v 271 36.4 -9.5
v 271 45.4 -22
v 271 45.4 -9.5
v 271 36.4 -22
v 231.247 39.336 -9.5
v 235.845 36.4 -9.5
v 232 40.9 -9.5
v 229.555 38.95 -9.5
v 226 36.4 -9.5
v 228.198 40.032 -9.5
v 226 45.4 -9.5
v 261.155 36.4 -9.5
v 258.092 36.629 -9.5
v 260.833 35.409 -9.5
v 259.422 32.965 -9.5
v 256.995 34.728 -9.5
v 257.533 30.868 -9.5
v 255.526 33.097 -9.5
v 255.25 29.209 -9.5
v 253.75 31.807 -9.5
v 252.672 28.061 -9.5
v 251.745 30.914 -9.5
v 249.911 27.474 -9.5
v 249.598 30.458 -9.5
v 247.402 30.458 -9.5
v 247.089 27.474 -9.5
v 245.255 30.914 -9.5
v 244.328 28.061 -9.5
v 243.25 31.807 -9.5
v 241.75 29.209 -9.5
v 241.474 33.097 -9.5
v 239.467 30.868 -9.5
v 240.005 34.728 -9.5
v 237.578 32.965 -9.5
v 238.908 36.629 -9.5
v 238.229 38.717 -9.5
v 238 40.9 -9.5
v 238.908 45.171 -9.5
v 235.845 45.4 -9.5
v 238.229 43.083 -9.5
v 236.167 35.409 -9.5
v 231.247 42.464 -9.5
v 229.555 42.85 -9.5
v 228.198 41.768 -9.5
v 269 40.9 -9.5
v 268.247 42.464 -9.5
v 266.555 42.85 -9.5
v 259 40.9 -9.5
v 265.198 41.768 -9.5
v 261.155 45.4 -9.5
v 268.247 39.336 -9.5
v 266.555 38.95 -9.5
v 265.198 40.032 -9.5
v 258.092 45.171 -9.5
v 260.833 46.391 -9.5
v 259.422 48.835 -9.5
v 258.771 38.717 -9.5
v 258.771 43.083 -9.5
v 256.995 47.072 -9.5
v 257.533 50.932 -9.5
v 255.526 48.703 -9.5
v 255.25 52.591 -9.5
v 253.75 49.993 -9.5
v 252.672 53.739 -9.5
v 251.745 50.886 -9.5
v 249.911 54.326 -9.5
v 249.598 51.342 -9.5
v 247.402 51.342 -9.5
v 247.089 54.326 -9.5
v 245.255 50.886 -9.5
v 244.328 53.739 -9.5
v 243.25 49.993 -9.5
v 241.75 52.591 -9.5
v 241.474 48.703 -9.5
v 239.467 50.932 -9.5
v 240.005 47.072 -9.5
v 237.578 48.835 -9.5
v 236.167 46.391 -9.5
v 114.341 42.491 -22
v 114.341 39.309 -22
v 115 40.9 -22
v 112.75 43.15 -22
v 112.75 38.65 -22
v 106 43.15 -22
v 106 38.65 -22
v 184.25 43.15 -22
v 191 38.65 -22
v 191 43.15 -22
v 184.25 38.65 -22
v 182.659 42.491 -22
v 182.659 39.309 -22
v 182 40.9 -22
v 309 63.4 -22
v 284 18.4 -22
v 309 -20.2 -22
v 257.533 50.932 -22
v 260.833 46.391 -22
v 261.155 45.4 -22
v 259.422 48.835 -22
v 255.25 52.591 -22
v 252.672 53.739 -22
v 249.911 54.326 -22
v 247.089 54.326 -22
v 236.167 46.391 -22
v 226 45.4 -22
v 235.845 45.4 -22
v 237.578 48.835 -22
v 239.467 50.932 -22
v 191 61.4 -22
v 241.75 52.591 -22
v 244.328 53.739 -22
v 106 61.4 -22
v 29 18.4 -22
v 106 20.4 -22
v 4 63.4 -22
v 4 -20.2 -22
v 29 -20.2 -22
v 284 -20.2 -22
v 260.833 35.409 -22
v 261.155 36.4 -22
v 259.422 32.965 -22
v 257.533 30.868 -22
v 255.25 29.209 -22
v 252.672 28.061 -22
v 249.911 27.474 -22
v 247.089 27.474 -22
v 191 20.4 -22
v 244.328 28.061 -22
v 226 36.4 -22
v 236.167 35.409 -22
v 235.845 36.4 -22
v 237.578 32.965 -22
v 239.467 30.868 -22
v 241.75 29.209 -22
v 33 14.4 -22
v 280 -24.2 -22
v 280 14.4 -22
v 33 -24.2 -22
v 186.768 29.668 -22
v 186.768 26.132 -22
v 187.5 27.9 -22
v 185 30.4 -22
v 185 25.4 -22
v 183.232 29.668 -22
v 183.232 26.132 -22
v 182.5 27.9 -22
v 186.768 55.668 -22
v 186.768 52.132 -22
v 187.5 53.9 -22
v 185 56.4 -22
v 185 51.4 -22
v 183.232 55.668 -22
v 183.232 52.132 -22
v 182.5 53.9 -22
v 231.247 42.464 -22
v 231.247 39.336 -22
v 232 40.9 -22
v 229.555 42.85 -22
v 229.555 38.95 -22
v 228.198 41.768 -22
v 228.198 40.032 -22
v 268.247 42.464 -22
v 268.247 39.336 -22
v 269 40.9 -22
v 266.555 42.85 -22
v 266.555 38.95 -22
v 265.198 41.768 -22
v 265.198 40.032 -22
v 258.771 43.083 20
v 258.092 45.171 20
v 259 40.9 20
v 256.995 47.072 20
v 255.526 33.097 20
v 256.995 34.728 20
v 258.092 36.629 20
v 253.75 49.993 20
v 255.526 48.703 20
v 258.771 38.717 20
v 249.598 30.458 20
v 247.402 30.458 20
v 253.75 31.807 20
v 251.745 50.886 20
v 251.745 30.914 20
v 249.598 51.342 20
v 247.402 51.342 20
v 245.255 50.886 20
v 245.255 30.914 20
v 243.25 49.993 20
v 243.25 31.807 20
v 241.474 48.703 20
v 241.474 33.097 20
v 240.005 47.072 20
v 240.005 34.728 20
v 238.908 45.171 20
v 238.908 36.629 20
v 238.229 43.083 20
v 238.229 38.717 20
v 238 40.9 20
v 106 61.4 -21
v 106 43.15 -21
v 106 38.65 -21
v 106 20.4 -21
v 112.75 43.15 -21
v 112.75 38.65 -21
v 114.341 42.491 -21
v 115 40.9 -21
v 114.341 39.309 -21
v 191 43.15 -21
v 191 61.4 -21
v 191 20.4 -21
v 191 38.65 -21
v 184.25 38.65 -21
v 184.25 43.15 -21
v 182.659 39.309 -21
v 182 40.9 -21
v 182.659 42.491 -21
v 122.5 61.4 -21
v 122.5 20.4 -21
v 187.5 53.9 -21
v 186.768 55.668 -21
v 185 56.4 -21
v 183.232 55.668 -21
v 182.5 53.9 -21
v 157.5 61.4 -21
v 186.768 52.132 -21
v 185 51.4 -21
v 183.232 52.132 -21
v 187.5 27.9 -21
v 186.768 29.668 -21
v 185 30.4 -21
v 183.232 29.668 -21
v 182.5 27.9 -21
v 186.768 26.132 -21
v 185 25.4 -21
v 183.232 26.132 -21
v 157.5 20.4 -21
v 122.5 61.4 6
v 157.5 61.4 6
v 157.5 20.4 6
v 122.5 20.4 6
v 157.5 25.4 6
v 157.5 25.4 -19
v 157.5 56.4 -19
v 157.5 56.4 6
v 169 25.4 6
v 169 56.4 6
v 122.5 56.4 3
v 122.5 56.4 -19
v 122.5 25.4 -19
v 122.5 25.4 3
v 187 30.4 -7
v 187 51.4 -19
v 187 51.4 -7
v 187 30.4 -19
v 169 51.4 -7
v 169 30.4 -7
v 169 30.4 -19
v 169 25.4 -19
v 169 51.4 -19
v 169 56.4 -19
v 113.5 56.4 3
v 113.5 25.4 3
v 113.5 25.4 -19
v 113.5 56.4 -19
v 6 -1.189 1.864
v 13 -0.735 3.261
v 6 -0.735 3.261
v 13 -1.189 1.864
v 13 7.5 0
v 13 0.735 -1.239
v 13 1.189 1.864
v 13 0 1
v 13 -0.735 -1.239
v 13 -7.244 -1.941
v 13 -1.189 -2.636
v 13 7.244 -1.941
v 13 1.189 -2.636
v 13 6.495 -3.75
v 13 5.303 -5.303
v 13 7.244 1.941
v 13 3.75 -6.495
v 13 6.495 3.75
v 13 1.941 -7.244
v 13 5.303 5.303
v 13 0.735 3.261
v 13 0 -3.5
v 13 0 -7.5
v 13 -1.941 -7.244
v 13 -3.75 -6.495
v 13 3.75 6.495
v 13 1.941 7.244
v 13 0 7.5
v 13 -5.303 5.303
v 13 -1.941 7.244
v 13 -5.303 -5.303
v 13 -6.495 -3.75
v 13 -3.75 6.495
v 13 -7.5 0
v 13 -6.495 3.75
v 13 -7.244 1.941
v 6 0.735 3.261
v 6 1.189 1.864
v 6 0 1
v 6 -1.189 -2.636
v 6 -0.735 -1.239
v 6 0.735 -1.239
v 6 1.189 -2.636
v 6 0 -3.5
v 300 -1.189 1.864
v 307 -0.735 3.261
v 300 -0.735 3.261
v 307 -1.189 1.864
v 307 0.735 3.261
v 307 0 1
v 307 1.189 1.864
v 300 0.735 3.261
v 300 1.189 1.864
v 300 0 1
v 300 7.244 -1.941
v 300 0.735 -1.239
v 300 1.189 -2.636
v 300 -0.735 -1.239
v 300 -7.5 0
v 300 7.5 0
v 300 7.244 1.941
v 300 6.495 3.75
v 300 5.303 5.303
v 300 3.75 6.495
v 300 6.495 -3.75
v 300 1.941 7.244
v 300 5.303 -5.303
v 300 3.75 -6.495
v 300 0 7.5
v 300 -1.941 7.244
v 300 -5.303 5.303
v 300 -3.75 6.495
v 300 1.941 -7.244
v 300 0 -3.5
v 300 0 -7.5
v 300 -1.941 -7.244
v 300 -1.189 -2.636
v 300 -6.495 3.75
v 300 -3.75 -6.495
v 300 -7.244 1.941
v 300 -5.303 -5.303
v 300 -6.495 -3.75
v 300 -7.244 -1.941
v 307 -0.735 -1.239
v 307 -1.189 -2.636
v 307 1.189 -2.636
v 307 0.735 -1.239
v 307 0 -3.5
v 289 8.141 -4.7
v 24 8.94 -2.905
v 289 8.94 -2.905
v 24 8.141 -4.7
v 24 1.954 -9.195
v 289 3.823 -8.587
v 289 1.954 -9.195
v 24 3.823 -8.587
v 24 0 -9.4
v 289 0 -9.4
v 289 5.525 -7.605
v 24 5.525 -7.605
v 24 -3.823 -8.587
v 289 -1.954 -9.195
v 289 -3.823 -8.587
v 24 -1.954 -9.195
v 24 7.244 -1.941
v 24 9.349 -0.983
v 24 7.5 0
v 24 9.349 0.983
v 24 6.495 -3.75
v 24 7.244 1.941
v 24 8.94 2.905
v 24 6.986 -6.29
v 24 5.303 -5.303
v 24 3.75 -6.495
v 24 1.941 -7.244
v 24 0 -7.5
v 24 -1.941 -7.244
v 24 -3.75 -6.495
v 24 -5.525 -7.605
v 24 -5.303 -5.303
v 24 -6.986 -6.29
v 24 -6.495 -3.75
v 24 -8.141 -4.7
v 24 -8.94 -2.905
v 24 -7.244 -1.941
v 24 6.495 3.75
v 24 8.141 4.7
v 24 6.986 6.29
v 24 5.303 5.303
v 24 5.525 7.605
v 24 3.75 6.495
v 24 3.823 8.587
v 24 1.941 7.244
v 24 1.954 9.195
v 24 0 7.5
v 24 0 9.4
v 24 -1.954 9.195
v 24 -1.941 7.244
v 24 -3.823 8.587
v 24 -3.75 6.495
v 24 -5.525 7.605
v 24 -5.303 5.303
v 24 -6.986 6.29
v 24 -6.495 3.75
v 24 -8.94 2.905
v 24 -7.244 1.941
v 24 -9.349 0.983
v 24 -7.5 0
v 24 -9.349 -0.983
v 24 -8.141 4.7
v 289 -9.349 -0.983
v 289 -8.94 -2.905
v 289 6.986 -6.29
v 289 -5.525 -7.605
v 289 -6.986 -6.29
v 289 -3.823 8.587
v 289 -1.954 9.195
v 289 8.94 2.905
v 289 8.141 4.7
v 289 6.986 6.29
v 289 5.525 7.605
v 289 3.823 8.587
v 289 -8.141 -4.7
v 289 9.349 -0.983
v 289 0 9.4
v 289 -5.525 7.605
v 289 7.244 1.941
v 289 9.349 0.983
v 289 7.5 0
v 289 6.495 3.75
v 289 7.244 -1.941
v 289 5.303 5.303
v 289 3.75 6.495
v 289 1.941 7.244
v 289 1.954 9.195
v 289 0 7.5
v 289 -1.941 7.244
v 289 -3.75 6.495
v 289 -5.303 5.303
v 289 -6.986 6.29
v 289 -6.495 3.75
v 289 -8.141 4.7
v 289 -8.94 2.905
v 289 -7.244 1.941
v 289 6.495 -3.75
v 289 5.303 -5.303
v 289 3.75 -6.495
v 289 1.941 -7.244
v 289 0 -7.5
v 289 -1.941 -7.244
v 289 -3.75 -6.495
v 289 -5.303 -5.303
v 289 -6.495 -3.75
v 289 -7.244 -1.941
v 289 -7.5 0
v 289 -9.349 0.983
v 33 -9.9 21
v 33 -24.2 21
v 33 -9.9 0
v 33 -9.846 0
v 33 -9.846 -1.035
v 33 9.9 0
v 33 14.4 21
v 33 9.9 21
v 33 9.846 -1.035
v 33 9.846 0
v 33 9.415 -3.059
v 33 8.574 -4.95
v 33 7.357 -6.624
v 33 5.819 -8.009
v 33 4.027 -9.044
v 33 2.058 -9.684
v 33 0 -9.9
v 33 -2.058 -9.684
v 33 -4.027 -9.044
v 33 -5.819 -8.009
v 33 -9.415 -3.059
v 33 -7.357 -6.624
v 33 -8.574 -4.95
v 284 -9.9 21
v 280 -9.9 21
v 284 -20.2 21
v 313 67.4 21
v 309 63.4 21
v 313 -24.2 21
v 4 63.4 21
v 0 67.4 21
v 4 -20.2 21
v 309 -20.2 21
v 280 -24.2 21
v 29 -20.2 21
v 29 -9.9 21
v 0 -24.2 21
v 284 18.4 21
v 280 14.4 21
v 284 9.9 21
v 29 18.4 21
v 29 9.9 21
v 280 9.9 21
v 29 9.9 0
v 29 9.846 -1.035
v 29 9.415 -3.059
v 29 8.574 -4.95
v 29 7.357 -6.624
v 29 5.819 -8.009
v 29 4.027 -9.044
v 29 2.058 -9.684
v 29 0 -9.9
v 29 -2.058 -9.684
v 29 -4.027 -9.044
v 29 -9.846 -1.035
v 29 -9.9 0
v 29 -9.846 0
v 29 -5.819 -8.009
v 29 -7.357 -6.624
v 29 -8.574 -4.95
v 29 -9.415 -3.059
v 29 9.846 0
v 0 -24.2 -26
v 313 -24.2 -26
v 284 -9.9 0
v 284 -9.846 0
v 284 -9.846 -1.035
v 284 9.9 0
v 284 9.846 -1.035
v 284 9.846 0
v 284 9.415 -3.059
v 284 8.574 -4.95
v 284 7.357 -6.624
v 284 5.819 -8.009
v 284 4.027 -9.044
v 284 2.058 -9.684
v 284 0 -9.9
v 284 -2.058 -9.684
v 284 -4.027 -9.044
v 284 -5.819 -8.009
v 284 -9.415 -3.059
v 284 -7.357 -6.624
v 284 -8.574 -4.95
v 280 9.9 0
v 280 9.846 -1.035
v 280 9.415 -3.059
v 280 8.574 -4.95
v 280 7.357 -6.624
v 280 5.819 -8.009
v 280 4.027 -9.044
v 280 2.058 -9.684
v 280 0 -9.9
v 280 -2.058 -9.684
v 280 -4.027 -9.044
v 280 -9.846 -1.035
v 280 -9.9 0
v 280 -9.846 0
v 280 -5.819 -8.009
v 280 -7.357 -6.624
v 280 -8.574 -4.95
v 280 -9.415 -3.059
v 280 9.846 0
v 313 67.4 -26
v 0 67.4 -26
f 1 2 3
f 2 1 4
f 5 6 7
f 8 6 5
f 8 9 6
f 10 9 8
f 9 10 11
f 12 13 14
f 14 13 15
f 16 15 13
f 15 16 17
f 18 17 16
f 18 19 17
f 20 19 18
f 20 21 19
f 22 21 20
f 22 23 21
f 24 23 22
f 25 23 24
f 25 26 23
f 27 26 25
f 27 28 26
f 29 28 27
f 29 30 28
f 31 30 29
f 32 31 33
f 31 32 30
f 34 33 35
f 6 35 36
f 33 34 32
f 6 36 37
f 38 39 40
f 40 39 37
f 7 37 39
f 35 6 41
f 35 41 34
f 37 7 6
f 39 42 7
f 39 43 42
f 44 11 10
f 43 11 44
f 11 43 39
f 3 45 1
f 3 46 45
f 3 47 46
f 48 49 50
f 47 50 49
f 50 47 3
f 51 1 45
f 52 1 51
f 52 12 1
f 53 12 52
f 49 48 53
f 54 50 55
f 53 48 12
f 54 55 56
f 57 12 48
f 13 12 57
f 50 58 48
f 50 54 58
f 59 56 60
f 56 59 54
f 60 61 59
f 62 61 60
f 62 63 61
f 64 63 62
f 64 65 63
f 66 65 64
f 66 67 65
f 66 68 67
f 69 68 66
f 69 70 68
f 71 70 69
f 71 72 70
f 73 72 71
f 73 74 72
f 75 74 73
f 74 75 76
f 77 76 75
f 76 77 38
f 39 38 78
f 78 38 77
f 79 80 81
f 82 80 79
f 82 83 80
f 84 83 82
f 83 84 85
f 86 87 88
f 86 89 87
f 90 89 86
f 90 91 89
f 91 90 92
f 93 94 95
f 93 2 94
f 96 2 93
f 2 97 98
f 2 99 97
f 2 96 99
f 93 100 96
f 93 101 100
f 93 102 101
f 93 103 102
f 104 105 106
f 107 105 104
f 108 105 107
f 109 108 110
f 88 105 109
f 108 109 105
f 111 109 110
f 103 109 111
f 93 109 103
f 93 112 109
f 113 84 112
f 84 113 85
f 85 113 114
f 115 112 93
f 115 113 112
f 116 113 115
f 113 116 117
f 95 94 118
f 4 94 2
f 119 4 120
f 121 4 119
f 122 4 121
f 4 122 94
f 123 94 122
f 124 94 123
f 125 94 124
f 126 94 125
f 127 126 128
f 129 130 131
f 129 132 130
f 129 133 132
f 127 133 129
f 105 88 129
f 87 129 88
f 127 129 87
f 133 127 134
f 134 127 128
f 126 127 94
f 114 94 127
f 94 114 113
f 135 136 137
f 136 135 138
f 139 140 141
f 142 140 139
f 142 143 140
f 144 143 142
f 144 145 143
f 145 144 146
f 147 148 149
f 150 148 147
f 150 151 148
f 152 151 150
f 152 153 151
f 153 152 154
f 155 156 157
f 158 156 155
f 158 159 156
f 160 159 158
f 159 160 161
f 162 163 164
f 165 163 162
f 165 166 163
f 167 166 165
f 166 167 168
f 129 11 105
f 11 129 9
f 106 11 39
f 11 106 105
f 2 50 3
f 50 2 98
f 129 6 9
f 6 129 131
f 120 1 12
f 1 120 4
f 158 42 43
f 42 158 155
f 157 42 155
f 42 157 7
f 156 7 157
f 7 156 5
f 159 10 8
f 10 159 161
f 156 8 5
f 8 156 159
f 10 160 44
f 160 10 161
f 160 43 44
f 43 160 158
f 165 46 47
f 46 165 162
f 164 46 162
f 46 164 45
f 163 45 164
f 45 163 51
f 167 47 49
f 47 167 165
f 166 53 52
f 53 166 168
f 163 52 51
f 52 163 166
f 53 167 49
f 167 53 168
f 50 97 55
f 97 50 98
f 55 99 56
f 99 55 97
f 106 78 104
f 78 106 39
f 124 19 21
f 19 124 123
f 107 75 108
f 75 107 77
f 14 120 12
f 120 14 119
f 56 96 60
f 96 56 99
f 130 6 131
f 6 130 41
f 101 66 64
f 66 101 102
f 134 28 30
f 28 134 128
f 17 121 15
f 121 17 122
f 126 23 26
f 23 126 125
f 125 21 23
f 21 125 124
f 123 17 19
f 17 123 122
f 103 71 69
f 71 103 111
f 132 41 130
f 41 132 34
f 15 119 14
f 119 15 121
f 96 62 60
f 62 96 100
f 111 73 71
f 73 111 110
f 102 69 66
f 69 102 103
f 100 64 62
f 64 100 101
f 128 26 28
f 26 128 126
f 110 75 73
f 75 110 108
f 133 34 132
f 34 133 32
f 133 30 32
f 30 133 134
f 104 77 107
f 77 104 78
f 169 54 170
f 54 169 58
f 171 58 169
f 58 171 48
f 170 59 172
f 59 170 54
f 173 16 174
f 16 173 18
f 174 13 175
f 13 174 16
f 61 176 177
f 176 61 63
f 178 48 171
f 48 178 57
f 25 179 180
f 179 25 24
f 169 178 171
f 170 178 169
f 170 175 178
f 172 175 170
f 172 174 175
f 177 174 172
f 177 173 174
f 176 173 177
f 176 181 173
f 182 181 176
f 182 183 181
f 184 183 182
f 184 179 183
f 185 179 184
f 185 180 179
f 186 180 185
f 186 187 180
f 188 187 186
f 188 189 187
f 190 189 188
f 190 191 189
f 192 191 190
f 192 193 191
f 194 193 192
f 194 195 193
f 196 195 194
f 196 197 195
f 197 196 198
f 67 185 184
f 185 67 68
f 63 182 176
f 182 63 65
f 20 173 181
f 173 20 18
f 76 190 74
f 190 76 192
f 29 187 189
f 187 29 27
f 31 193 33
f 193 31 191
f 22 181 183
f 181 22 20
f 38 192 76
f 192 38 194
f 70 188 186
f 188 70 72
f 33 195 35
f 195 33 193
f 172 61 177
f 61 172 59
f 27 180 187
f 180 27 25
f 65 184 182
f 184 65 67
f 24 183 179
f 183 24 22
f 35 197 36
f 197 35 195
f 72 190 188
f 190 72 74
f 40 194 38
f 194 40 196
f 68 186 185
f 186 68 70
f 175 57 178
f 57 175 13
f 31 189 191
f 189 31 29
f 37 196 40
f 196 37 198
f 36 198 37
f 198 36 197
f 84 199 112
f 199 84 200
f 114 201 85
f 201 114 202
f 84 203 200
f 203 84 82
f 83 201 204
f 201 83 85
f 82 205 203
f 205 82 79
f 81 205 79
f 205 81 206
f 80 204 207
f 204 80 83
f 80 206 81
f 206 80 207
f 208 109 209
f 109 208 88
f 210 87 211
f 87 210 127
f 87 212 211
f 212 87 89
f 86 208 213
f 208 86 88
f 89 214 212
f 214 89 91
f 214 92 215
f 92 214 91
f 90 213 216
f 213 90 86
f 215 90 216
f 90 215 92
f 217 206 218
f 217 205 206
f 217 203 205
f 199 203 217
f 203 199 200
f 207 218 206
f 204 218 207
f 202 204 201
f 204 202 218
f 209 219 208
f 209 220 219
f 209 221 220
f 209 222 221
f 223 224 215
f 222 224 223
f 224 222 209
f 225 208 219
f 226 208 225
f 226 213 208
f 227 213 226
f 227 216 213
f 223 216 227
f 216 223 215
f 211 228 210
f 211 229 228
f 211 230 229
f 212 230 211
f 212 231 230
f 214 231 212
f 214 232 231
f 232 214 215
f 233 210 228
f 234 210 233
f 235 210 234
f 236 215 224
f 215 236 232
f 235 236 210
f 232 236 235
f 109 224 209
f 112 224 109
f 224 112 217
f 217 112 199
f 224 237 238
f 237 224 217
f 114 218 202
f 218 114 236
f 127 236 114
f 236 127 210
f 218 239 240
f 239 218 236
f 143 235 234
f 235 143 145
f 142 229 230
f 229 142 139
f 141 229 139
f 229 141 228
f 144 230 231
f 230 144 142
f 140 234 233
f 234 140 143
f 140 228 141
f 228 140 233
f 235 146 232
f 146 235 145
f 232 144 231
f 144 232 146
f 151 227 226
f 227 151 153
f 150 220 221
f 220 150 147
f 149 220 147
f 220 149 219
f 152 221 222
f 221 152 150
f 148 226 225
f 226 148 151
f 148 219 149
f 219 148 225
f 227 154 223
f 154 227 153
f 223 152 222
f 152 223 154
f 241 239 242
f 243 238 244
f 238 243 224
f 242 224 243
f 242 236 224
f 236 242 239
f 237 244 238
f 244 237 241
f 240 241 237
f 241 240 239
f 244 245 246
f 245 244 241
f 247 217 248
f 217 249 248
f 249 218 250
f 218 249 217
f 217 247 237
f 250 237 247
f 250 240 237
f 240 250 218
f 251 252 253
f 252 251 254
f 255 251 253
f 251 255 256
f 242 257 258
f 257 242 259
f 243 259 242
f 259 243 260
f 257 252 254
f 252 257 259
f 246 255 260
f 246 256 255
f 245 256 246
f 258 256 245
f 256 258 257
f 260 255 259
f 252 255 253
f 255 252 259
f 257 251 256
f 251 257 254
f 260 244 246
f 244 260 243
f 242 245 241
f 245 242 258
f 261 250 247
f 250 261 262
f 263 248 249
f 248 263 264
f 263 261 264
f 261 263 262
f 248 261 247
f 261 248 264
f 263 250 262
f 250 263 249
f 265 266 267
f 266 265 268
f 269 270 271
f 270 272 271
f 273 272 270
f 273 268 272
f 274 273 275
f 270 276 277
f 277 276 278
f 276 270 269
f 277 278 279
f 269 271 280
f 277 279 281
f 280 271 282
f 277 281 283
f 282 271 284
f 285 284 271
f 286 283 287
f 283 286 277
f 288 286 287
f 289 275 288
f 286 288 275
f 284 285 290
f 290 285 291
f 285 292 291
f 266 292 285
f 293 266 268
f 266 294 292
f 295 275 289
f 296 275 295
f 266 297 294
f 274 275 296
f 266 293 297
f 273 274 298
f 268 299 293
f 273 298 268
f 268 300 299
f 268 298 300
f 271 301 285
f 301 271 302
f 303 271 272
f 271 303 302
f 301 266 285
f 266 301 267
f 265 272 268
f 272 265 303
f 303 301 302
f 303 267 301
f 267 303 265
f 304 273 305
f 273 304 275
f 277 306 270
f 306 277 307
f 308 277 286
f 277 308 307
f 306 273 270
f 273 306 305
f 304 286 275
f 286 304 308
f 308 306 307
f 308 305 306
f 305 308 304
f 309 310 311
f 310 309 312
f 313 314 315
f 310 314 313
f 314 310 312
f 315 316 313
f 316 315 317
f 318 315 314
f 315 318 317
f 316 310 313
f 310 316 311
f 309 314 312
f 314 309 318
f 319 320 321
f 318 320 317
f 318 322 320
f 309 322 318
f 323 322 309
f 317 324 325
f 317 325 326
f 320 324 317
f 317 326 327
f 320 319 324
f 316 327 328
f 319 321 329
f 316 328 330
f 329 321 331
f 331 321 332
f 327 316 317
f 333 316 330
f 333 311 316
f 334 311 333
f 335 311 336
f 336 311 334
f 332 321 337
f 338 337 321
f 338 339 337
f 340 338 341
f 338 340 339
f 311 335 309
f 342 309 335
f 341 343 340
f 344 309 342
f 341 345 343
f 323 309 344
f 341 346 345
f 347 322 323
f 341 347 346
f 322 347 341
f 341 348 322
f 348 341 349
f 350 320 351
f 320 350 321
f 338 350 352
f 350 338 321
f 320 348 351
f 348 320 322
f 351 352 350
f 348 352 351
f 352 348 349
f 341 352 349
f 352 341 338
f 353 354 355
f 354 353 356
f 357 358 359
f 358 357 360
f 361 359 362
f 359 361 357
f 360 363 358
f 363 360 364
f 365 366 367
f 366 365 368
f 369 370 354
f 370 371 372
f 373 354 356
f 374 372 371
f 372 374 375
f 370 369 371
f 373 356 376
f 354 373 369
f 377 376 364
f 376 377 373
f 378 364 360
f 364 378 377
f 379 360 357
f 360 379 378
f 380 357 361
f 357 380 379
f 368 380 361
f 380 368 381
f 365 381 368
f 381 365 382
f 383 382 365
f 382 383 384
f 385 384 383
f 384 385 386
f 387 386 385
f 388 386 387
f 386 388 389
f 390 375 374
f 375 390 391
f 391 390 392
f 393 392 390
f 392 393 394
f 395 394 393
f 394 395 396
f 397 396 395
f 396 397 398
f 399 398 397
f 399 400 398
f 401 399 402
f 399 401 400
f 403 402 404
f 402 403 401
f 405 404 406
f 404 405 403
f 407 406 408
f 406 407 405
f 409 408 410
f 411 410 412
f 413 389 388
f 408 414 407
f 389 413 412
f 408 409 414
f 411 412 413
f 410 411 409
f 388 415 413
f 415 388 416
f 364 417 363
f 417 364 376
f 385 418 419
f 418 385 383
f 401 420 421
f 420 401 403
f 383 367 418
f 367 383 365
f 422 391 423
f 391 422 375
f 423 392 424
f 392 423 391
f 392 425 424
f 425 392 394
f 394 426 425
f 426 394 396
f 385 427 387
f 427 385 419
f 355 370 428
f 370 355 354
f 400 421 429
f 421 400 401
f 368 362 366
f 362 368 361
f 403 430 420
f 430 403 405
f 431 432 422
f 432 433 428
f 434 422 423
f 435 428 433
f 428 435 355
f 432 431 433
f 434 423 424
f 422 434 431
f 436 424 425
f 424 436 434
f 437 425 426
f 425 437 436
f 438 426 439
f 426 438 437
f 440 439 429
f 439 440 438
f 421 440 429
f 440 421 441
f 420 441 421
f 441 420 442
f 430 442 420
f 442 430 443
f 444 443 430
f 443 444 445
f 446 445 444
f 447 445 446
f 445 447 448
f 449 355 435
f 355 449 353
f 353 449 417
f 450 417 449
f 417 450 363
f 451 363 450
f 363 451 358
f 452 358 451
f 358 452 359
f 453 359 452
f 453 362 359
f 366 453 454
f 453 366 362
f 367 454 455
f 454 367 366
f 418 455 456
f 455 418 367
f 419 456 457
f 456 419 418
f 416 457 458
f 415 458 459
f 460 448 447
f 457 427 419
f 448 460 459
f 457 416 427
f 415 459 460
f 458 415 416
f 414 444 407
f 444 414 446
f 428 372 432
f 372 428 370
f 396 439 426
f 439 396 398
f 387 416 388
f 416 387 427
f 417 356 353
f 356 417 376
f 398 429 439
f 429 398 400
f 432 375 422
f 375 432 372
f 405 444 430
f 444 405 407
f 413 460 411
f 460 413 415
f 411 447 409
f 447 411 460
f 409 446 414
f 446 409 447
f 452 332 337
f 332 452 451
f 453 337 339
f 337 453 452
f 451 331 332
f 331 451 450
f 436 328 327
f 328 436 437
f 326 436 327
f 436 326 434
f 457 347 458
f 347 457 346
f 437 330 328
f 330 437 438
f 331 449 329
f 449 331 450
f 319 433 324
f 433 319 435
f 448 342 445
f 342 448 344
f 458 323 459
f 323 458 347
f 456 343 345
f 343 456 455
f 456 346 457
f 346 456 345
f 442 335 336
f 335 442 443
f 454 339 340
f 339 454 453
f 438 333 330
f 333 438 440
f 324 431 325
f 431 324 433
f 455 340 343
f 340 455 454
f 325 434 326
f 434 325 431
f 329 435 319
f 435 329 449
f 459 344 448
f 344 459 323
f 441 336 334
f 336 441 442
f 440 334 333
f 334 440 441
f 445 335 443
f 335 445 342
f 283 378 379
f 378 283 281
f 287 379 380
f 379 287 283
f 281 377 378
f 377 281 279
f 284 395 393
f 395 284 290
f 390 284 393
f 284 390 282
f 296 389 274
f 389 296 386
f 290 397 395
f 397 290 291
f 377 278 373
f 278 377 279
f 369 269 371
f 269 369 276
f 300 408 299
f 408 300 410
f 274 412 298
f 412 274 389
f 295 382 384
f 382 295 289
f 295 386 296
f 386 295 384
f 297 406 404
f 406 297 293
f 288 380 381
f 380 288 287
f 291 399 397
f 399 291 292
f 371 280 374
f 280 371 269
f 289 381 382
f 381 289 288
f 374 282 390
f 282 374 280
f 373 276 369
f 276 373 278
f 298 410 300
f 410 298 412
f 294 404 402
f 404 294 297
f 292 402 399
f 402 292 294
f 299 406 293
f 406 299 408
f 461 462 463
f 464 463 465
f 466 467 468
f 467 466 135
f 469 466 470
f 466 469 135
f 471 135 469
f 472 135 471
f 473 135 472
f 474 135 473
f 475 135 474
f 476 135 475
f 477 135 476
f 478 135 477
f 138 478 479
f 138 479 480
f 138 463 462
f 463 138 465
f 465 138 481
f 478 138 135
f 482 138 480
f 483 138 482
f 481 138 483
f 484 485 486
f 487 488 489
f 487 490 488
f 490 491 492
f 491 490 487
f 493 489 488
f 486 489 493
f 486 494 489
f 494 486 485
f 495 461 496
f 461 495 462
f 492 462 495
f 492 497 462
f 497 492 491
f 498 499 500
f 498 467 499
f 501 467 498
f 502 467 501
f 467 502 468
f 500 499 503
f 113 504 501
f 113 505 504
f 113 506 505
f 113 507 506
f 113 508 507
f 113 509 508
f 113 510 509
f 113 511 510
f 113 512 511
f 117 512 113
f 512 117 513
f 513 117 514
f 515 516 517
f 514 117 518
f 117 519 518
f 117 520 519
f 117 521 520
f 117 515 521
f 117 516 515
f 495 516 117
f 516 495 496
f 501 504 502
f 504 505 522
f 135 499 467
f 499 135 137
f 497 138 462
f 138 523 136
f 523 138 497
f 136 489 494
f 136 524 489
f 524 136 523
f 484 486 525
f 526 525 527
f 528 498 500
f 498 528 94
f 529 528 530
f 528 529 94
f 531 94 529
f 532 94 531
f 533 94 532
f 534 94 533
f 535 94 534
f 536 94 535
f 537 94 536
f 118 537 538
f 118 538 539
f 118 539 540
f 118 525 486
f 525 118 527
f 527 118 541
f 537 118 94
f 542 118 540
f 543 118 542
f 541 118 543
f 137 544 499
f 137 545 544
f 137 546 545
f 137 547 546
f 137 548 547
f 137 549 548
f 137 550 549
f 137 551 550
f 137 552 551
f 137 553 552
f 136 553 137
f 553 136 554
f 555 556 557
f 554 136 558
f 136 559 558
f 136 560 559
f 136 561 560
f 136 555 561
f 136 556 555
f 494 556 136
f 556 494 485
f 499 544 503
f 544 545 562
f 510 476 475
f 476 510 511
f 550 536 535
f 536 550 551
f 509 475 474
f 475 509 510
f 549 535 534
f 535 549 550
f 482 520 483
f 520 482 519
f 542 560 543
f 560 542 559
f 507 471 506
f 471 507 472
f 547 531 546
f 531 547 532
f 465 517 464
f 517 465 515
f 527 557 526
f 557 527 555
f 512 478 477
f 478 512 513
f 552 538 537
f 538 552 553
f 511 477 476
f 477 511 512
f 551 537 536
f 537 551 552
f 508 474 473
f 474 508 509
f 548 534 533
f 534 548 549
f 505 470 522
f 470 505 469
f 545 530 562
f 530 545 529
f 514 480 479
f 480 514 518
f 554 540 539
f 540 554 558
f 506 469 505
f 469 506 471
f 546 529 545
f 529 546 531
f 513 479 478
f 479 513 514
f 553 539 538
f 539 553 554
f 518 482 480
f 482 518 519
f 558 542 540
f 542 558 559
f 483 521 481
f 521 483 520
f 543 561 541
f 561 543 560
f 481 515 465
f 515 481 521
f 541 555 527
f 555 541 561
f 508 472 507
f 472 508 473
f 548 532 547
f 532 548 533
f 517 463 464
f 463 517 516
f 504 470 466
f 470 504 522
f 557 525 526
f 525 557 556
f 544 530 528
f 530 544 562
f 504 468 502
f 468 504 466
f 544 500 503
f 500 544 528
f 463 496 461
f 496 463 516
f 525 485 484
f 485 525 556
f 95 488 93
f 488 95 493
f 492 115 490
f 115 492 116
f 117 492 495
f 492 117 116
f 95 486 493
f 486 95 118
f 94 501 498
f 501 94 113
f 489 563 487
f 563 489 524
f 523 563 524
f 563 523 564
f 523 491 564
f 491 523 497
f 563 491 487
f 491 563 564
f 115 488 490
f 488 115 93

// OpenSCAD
// file: componentes.scad
function diametro_tubo_germicida() = 18.8;
function longitud_tubo_germicida() = 265+2*11+2*7;

module tubo_germicida() {
    LONGITUD_VIDRIO = 265;
    DIAMETRO_VIDRIO = 18.8;
    LONGITUD_METAL = 11;
    DIAMETRO_METAL = 15;
    LONGITUD_PIN = 7;
    DIAMETRO_PIN = 2.5;
    SEPARACION_PIN = 4.5;
    module pin() {
        cylinder(h=LONGITUD_PIN, d=DIAMETRO_PIN);
    }
    module metalsito() {
        color([1,1,1]*.8)
        cylinder(h=LONGITUD_METAL, d=DIAMETRO_METAL);
    }
    module tubo_de_vidrio() {
        color([1,1,1], alpha=.4)
        cylinder(h=LONGITUD_VIDRIO, d=DIAMETRO_VIDRIO);
    }
    
    translate([-SEPARACION_PIN/2,0,0])
        pin();
    translate([SEPARACION_PIN/2,0,0])
        pin();
    translate([-SEPARACION_PIN/2,0,2*LONGITUD_METAL+LONGITUD_VIDRIO+LONGITUD_PIN])
        pin();
    translate([SEPARACION_PIN/2,0,2*LONGITUD_METAL+LONGITUD_VIDRIO+LONGITUD_PIN])
        pin();
    
    translate([0,0,LONGITUD_METAL+LONGITUD_PIN])
        tubo_de_vidrio();

    translate([0,0,LONGITUD_METAL+LONGITUD_VIDRIO+LONGITUD_PIN])
        metalsito();
    translate([0,0,LONGITUD_PIN])
        metalsito();
}

function dimensiones_reactancia() = [85,41,28];

module reactancia() {
    module ranura() {
        translate([0,0,-1]) {
            cube([9-4.5/2,4.5,3]);
            translate([9-4.5/2,4.5/2,0])
                cylinder(h=3,d=4.5);
        }
    }
    module agujero() {
        translate([0,0,-1])
            cylinder(h=3,d=5);
    }
    color([1,1,1]) {
        difference() {
            cube([85,41,1]);
            translate([0,41/2-4.5/2,0])
                ranura();
            translate([85,41/2+4.5/2,0])
                rotate(a=180,v=[0,0,1])
                    ranura();
            translate([76.5+5/2,5+5/2,0])
                agujero();
            translate([76.5+5/2,41-5-5/2,0])
                agujero();
        }
        translate([16.5,0,0])
            cube([35,41,28]);
        translate([63,41/2-21/2,3])
            cube([18,21,12]);
        translate([51,(41-31)/2,3])
            cube([12,31,25]);
        translate([16.5-9,(41-31)/2,3])
            cube([9,31,22]);
    }
}

module arrancador() {
    color([.3,.4,1], alpha=.5)
        cylinder(h=35,d=21);
}

module zocalo_arrancador() {
    color([1,1,1]) {
        difference() {
            cube([45,9,12.5]);
            translate([45/2-37/2,9/2,-1])
                cylinder(h=15,d=4);
            translate([45/2+37/2,9/2,-1])
                cylinder(h=15,d=4);
        }
        translate([45/2,9/2,0])
            cylinder(h=12.5,d=27);
    }
}

module zocalo_con_arrancador() {
    zocalo_arrancador();
    translate([45/2,9/2,42-35])
        arrancador();
}

function dimensiones_zocalo_con_arrancador() = [45,27,42];
// main file
use <componentes.scad>

ESPESOR_MINIMO = 4;
EXCESO_LONGITUDINAL = 2;
SEPARACION_BASE_TUBO = 5;
POSICION_ARRANCADOR_X = 220;
POSICION_REACTANCIA_X = 100;
LUZ_COMPONENTES_PAREDES = 2;
LONGITUD_EXPUESTA_TUBO = longitud_tubo_germicida()-2*11-2*7-10;
LUZ_PORTA_TUBOS = 1;

module base() {
    translate ([
        /*x*/ESPESOR_MINIMO+EXCESO_LONGITUDINAL+longitud_tubo_germicida()/2-LONGITUD_EXPUESTA_TUBO/2,
        /*y*/diametro_tubo_germicida()/2+SEPARACION_BASE_TUBO,
        /*z*/-dimensiones_zocalo_con_arrancador()[2]/2-LUZ_COMPONENTES_PAREDES/2
    ]) cube([
        /*x*/LONGITUD_EXPUESTA_TUBO,
        /*y*/ESPESOR_MINIMO,
        /*z*/dimensiones_zocalo_con_arrancador()[2]+LUZ_COMPONENTES_PAREDES/2
    ]);
    translate ([
        /*x*/0,
        /*y*/diametro_tubo_germicida()/2+SEPARACION_BASE_TUBO+ESPESOR_MINIMO-SEPARACION_BASE_TUBO-2*diametro_tubo_germicida(),
        /*z*/-ESPESOR_MINIMO-dimensiones_zocalo_con_arrancador()[2]/2-LUZ_COMPONENTES_PAREDES/2
    ]) cube ([
        /*x*/2*ESPESOR_MINIMO+longitud_tubo_germicida()+2*EXCESO_LONGITUDINAL, 
        /*y*/ESPESOR_MINIMO+dimensiones_reactancia()[1]+2*LUZ_COMPONENTES_PAREDES+SEPARACION_BASE_TUBO+2*diametro_tubo_germicida(), 
        /*z*/ESPESOR_MINIMO
    ]);
    translate ([
        /*x*/0,
        /*y*/diametro_tubo_germicida()/2+SEPARACION_BASE_TUBO+ESPESOR_MINIMO+2*LUZ_COMPONENTES_PAREDES+dimensiones_reactancia()[1],
        /*z*/-dimensiones_zocalo_con_arrancador()[2]/2-LUZ_COMPONENTES_PAREDES/2,
    ]) cube ([
        /*x*/2*ESPESOR_MINIMO+longitud_tubo_germicida()+2*EXCESO_LONGITUDINAL, 
        /*y*/ESPESOR_MINIMO,
        /*z*/dimensiones_zocalo_con_arrancador()[2]+LUZ_COMPONENTES_PAREDES/2
    ]);
    translate ([
        /*x*/0,
        /*y*/diametro_tubo_germicida()/2+SEPARACION_BASE_TUBO+ESPESOR_MINIMO+2*LUZ_COMPONENTES_PAREDES+dimensiones_reactancia()[1] -(dimensiones_reactancia()[1]+2*LUZ_COMPONENTES_PAREDES+SEPARACION_BASE_TUBO+2*diametro_tubo_germicida()) ,
        /*z*/-dimensiones_zocalo_con_arrancador()[2]/2-LUZ_COMPONENTES_PAREDES/2,
    ]) cube ([
        /*x*/ESPESOR_MINIMO, 
        /*y*/dimensiones_reactancia()[1]+2*LUZ_COMPONENTES_PAREDES+SEPARACION_BASE_TUBO+2*diametro_tubo_germicida(),
        /*z*/dimensiones_zocalo_con_arrancador()[2]+LUZ_COMPONENTES_PAREDES/2
    ]);
    translate ([
        /*x*/ESPESOR_MINIMO+longitud_tubo_germicida()+2*EXCESO_LONGITUDINAL,
        /*y*/diametro_tubo_germicida()/2+SEPARACION_BASE_TUBO+ESPESOR_MINIMO+2*LUZ_COMPONENTES_PAREDES+dimensiones_reactancia()[1] -(dimensiones_reactancia()[1]+2*LUZ_COMPONENTES_PAREDES+SEPARACION_BASE_TUBO+2*diametro_tubo_germicida()) ,
        /*z*/-dimensiones_zocalo_con_arrancador()[2]/2-LUZ_COMPONENTES_PAREDES/2,
    ]) cube ([
        /*x*/ESPESOR_MINIMO, 
        /*y*/dimensiones_reactancia()[1]+2*LUZ_COMPONENTES_PAREDES+SEPARACION_BASE_TUBO+2*diametro_tubo_germicida(),
        /*z*/dimensiones_zocalo_con_arrancador()[2]+LUZ_COMPONENTES_PAREDES/2
    ]);
    difference() {
        union() {
            translate ([
                /*x*/ESPESOR_MINIMO+EXCESO_LONGITUDINAL+longitud_tubo_germicida()/2-LONGITUD_EXPUESTA_TUBO/2,
                /*y*/diametro_tubo_germicida()/2+SEPARACION_BASE_TUBO+ESPESOR_MINIMO+2*LUZ_COMPONENTES_PAREDES+dimensiones_reactancia()[1] -(dimensiones_reactancia()[1]+2*LUZ_COMPONENTES_PAREDES+SEPARACION_BASE_TUBO+2*diametro_tubo_germicida()),
                /*z*/-dimensiones_zocalo_con_arrancador()[2]/2-LUZ_COMPONENTES_PAREDES/2,
            ]) cube ([
                /*x*/ESPESOR_MINIMO, 
                /*y*/diametro_tubo_germicida()/2+SEPARACION_BASE_TUBO - (diametro_tubo_germicida()/2+SEPARACION_BASE_TUBO+ESPESOR_MINIMO-SEPARACION_BASE_TUBO-2*diametro_tubo_germicida()),
                /*z*/dimensiones_zocalo_con_arrancador()[2]+LUZ_COMPONENTES_PAREDES/2
            ]);
            translate ([
                /*x*/EXCESO_LONGITUDINAL+longitud_tubo_germicida()/2+LONGITUD_EXPUESTA_TUBO/2,
                /*y*/diametro_tubo_germicida()/2+SEPARACION_BASE_TUBO+ESPESOR_MINIMO+2*LUZ_COMPONENTES_PAREDES+dimensiones_reactancia()[1] -(dimensiones_reactancia()[1]+2*LUZ_COMPONENTES_PAREDES+SEPARACION_BASE_TUBO+2*diametro_tubo_germicida()),
                /*z*/-dimensiones_zocalo_con_arrancador()[2]/2-LUZ_COMPONENTES_PAREDES/2,
            ]) cube ([
                /*x*/ESPESOR_MINIMO, 
                /*y*/diametro_tubo_germicida()/2+SEPARACION_BASE_TUBO - (diametro_tubo_germicida()/2+SEPARACION_BASE_TUBO+ESPESOR_MINIMO-SEPARACION_BASE_TUBO-2*diametro_tubo_germicida()),
                /*z*/dimensiones_zocalo_con_arrancador()[2]+LUZ_COMPONENTES_PAREDES/2
            ]);
        }
        translate([ESPESOR_MINIMO+EXCESO_LONGITUDINAL,0,0]) rotate(a=90,v=[0,1,0]) cylinder(h=longitud_tubo_germicida(),d=diametro_tubo_germicida()+LUZ_PORTA_TUBOS);
        translate ([
        /*x*/ESPESOR_MINIMO+EXCESO_LONGITUDINAL,
        /*y*/-diametro_tubo_germicida()/2-LUZ_PORTA_TUBOS/2,
        /*z*/0,
    ]) cube([
        /*x*/longitud_tubo_germicida(),
        /*y*/diametro_tubo_germicida()+LUZ_PORTA_TUBOS,
        /*z*/dimensiones_zocalo_con_arrancador()[2]+LUZ_COMPONENTES_PAREDES/2]);
    }
    difference() {
        translate ([
            /*x*/ESPESOR_MINIMO,
            /*y*/diametro_tubo_germicida()/2+SEPARACION_BASE_TUBO+ESPESOR_MINIMO+2*LUZ_COMPONENTES_PAREDES+dimensiones_reactancia()[1] -(dimensiones_reactancia()[1]+2*LUZ_COMPONENTES_PAREDES+SEPARACION_BASE_TUBO+2*diametro_tubo_germicida()),
            /*z*/-dimensiones_zocalo_con_arrancador()[2]/2-LUZ_COMPONENTES_PAREDES/2,
        ]) cube ([
            /*x*/longitud_tubo_germicida()+2*EXCESO_LONGITUDINAL, 
            /*y*/ESPESOR_MINIMO,
            /*z*/dimensiones_zocalo_con_arrancador()[2]+LUZ_COMPONENTES_PAREDES/2
        ]);
        translate ([
        /*x*/ESPESOR_MINIMO+EXCESO_LONGITUDINAL+longitud_tubo_germicida()/2-LONGITUD_EXPUESTA_TUBO/2,
        /*y*/diametro_tubo_germicida()/2+SEPARACION_BASE_TUBO+ESPESOR_MINIMO+2*LUZ_COMPONENTES_PAREDES+dimensiones_reactancia()[1] -(dimensiones_reactancia()[1]+2*LUZ_COMPONENTES_PAREDES+SEPARACION_BASE_TUBO+2*diametro_tubo_germicida())-ESPESOR_MINIMO,
        /*z*/-dimensiones_zocalo_con_arrancador()[2]/2-LUZ_COMPONENTES_PAREDES/2-ESPESOR_MINIMO
    ]) cube([
        /*x*/LONGITUD_EXPUESTA_TUBO,
        /*y*/3*ESPESOR_MINIMO,
        /*z*/dimensiones_zocalo_con_arrancador()[2]+LUZ_COMPONENTES_PAREDES/2+2*ESPESOR_MINIMO
    ]);
    }
    
    
//    translate ([
//        /*x*/0,
//        /*y*/0,
//        /*z*/0,
//    ]) cube ([
//        /*x*/0, 
//        /*y*/0,
//        /*z*/0
//    ]);
}

translate([EXCESO_LONGITUDINAL+ESPESOR_MINIMO,0,0]) {
    translate([
        /*x*/0,
        /*y*/diametro_tubo_germicida()/2+SEPARACION_BASE_TUBO+ESPESOR_MINIMO+LUZ_COMPONENTES_PAREDES,
        /*z*/-dimensiones_zocalo_con_arrancador()[2]/2-LUZ_COMPONENTES_PAREDES/2
        ]) {
        translate([POSICION_ARRANCADOR_X,-9/2+dimensiones_reactancia()[1]/2,0])
            zocalo_con_arrancador();
        translate([POSICION_REACTANCIA_X,0,0])
            reactancia();
    }
    rotate(a=90, v=[0,1,0])
        tubo_germicida();
}
base();
